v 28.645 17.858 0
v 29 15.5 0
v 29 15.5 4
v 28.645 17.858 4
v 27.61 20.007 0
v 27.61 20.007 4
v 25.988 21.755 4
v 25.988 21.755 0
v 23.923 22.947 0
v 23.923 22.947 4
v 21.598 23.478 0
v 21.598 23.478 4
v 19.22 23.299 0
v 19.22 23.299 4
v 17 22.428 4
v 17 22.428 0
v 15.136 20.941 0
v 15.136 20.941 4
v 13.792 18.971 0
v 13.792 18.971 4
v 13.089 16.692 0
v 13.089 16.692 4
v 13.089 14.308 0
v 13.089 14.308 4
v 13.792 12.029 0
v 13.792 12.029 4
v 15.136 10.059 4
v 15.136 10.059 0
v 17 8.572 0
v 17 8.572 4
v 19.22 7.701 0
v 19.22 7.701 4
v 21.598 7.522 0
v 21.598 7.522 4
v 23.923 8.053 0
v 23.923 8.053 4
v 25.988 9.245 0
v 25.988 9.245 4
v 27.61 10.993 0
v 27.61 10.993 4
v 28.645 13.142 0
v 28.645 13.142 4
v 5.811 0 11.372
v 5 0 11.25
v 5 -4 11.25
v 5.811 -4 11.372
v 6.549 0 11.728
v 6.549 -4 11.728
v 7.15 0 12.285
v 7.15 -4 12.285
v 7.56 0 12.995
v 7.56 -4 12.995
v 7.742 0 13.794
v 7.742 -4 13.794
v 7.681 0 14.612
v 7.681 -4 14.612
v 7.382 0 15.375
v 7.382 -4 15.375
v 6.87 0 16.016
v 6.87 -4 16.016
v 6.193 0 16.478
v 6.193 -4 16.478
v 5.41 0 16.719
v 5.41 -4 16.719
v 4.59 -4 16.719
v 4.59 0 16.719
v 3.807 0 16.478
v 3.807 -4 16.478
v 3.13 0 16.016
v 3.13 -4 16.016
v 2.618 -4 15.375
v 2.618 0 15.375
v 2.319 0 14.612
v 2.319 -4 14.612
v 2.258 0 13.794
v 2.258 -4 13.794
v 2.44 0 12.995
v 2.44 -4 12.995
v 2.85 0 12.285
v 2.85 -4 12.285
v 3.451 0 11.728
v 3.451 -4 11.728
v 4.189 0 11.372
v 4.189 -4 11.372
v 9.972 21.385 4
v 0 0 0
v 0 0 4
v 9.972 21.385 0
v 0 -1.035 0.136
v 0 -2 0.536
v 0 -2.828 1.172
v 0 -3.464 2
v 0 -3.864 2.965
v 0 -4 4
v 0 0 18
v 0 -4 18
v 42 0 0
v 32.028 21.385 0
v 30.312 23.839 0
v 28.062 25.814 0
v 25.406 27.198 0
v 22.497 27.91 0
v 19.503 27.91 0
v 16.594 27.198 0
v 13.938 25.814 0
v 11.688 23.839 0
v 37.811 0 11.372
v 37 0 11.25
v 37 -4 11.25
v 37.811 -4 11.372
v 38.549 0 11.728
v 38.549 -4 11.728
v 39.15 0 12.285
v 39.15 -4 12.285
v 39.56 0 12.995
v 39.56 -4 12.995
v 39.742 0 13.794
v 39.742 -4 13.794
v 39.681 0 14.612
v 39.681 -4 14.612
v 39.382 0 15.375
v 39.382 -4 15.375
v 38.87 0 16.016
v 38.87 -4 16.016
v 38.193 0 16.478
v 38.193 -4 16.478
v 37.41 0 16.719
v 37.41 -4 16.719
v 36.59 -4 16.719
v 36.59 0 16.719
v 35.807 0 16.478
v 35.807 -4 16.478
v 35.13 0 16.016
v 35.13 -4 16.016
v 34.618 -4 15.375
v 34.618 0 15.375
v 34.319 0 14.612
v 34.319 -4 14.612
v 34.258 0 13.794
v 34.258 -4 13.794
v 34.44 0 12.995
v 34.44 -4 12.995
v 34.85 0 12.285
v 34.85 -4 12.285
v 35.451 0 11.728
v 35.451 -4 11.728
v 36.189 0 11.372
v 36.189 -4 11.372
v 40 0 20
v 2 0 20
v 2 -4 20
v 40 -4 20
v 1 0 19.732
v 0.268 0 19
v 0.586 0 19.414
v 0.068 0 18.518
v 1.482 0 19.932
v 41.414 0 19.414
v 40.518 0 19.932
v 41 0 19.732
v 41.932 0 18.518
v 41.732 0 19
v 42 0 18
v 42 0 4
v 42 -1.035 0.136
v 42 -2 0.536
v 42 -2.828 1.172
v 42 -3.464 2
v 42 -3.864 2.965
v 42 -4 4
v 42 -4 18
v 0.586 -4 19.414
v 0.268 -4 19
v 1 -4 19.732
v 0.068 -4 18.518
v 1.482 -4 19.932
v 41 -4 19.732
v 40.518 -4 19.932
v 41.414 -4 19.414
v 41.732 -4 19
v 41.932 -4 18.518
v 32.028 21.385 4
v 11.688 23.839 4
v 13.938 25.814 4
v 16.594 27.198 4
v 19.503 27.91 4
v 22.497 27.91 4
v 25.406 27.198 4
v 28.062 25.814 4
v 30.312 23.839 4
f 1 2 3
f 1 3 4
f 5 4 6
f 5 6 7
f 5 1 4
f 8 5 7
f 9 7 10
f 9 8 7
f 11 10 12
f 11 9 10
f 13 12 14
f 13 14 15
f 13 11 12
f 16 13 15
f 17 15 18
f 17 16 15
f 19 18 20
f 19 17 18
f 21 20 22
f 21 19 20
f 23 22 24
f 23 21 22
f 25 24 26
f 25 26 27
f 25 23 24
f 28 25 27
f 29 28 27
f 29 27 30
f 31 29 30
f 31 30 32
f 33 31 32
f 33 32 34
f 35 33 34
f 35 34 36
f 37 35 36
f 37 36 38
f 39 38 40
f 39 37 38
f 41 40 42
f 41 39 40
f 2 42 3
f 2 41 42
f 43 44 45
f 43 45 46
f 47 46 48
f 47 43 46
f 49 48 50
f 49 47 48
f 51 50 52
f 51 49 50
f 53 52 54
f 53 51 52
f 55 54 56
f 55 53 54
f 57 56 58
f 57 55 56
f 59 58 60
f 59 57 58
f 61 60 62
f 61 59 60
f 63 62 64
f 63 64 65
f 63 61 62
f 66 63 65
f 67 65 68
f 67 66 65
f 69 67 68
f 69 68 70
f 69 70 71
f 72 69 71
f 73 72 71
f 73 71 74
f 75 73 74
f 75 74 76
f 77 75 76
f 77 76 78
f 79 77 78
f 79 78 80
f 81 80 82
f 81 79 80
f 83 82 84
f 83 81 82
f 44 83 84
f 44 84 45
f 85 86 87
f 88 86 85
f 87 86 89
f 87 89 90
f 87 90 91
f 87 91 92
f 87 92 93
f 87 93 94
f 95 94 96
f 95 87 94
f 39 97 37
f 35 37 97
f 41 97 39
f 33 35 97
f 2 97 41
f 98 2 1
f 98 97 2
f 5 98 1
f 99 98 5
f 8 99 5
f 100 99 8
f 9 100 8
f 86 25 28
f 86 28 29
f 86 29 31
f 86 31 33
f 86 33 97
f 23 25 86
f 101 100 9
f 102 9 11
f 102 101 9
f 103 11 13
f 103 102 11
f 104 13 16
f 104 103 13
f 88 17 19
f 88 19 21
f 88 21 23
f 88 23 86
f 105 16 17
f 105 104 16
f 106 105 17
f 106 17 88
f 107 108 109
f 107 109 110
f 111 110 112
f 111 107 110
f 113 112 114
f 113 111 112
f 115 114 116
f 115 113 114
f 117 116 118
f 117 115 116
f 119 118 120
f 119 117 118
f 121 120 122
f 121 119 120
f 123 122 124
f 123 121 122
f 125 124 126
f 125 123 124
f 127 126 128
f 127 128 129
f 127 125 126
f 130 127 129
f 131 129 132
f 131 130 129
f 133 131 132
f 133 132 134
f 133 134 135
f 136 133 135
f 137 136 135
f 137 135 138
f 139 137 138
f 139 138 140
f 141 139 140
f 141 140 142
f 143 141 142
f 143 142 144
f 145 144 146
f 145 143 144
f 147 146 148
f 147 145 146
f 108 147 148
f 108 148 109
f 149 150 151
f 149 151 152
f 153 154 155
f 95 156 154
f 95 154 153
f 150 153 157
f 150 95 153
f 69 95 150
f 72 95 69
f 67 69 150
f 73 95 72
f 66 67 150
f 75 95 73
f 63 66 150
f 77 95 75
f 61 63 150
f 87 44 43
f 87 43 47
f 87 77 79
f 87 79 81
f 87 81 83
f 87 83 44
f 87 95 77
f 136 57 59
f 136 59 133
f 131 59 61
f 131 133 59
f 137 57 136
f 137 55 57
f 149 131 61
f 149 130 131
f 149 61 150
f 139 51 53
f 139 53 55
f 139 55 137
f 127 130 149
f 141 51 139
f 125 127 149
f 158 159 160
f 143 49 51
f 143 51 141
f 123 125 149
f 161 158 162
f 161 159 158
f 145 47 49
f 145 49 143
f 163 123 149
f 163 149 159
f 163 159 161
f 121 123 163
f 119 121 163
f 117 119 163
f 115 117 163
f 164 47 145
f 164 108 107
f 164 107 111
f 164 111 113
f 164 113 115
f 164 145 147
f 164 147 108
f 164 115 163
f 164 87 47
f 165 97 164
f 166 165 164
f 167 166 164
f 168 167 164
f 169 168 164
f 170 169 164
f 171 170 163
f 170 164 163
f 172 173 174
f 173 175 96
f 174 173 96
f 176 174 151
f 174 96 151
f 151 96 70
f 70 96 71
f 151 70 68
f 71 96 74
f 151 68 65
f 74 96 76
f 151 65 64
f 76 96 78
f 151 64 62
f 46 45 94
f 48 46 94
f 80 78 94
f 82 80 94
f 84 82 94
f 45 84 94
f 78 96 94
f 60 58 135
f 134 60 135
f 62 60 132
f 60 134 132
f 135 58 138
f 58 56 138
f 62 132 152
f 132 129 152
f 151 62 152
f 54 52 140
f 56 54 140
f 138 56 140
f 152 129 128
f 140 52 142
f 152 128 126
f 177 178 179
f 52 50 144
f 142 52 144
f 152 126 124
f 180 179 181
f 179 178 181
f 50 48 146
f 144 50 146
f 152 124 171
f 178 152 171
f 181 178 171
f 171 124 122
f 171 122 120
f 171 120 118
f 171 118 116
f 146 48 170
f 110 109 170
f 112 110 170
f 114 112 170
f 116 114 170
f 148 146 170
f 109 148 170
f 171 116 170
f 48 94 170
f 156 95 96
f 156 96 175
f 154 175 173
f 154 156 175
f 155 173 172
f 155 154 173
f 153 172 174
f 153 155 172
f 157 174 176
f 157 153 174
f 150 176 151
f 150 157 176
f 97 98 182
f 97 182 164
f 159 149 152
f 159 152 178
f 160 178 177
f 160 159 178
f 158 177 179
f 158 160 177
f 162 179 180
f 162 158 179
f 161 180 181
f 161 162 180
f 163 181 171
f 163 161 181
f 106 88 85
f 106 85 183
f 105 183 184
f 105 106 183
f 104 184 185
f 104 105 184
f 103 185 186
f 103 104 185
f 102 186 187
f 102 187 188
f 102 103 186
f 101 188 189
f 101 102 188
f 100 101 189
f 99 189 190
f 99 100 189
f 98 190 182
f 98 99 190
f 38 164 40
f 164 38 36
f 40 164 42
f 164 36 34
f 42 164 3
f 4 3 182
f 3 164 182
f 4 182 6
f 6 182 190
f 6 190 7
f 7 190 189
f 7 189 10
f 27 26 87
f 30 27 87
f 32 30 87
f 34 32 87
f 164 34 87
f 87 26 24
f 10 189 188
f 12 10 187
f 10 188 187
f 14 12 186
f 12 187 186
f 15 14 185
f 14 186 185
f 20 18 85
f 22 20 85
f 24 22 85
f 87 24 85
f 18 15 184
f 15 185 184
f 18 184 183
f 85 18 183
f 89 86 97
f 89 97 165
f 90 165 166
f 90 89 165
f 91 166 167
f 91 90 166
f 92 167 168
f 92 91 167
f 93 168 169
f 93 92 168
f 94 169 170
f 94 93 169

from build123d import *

# Parameters (mm, degrees)
SKETCH1_R           = 8
BOSS_EXTRUDE1_DEPTH = 4
SKETCH2_R           = 2.75
BOSS_EXTRUDE2_DEPTH = 4
BOSS_EXTRUDE3_DEPTH = 42


with BuildPart() as part:
    # Sketch1 → Boss-Extrude1 (new body)
    with BuildSketch(Plane.XY):
        with BuildLine():
            Line((0, 0), (9.971912122, 21.384834556))
            ThreePointArc((9.971912122, 21.384834556), (21, 28), (32.028087878, 21.384834556))
            Line((32.028087878, 21.384834556), (42, 0))
            Line((42, 0), (0, 0))
        make_face()
        with Locations((21, 15.5)):
            Circle(SKETCH1_R, mode=Mode.SUBTRACT)
    extrude(amount=BOSS_EXTRUDE1_DEPTH)



with BuildPart() as body_2:
    # Sketch2 → Boss-Extrude2 (new body)
    with BuildSketch(Plane(origin=(0, 0, 0), x_dir=(-1, 0, 0), z_dir=(0, -1, 0))):
        with BuildLine():
            Line((0, -4), (0, -18))
            ThreePointArc((0, -18), (-0.585786438, -19.414213562), (-2, -20))
            Line((-2, -20), (-40, -20))
            ThreePointArc((-40, -20), (-41.414213562, -19.414213562), (-42, -18))
            Line((-42, -18), (-42, -4))
            Line((-42, -4), (0, -4))
        make_face()
        with Locations(Location((-37, -14, 0), (0, 0, 90))):
            Circle(SKETCH2_R, mode=Mode.SUBTRACT)
        with Locations(Location((-5, -14, 0), (0, 0, 90))):
            Circle(SKETCH2_R, mode=Mode.SUBTRACT)
    extrude(amount=BOSS_EXTRUDE2_DEPTH)


with BuildPart() as part_1:
    add(part.part)

    add(body_2.part)  # Boss-Extrude3 merges body 2
    # Sketch3 → Boss-Extrude3 (add)
    with BuildSketch(Plane.ZY):
        with BuildLine():
            Line((4, 0), (0, 0))
            ThreePointArc((0, 0), (1.171572875, -2.828427125), (4, -4))
            Line((4, -4), (4, 0))
        make_face()
    extrude(amount=-BOSS_EXTRUDE3_DEPTH)


solid = part_1.part
